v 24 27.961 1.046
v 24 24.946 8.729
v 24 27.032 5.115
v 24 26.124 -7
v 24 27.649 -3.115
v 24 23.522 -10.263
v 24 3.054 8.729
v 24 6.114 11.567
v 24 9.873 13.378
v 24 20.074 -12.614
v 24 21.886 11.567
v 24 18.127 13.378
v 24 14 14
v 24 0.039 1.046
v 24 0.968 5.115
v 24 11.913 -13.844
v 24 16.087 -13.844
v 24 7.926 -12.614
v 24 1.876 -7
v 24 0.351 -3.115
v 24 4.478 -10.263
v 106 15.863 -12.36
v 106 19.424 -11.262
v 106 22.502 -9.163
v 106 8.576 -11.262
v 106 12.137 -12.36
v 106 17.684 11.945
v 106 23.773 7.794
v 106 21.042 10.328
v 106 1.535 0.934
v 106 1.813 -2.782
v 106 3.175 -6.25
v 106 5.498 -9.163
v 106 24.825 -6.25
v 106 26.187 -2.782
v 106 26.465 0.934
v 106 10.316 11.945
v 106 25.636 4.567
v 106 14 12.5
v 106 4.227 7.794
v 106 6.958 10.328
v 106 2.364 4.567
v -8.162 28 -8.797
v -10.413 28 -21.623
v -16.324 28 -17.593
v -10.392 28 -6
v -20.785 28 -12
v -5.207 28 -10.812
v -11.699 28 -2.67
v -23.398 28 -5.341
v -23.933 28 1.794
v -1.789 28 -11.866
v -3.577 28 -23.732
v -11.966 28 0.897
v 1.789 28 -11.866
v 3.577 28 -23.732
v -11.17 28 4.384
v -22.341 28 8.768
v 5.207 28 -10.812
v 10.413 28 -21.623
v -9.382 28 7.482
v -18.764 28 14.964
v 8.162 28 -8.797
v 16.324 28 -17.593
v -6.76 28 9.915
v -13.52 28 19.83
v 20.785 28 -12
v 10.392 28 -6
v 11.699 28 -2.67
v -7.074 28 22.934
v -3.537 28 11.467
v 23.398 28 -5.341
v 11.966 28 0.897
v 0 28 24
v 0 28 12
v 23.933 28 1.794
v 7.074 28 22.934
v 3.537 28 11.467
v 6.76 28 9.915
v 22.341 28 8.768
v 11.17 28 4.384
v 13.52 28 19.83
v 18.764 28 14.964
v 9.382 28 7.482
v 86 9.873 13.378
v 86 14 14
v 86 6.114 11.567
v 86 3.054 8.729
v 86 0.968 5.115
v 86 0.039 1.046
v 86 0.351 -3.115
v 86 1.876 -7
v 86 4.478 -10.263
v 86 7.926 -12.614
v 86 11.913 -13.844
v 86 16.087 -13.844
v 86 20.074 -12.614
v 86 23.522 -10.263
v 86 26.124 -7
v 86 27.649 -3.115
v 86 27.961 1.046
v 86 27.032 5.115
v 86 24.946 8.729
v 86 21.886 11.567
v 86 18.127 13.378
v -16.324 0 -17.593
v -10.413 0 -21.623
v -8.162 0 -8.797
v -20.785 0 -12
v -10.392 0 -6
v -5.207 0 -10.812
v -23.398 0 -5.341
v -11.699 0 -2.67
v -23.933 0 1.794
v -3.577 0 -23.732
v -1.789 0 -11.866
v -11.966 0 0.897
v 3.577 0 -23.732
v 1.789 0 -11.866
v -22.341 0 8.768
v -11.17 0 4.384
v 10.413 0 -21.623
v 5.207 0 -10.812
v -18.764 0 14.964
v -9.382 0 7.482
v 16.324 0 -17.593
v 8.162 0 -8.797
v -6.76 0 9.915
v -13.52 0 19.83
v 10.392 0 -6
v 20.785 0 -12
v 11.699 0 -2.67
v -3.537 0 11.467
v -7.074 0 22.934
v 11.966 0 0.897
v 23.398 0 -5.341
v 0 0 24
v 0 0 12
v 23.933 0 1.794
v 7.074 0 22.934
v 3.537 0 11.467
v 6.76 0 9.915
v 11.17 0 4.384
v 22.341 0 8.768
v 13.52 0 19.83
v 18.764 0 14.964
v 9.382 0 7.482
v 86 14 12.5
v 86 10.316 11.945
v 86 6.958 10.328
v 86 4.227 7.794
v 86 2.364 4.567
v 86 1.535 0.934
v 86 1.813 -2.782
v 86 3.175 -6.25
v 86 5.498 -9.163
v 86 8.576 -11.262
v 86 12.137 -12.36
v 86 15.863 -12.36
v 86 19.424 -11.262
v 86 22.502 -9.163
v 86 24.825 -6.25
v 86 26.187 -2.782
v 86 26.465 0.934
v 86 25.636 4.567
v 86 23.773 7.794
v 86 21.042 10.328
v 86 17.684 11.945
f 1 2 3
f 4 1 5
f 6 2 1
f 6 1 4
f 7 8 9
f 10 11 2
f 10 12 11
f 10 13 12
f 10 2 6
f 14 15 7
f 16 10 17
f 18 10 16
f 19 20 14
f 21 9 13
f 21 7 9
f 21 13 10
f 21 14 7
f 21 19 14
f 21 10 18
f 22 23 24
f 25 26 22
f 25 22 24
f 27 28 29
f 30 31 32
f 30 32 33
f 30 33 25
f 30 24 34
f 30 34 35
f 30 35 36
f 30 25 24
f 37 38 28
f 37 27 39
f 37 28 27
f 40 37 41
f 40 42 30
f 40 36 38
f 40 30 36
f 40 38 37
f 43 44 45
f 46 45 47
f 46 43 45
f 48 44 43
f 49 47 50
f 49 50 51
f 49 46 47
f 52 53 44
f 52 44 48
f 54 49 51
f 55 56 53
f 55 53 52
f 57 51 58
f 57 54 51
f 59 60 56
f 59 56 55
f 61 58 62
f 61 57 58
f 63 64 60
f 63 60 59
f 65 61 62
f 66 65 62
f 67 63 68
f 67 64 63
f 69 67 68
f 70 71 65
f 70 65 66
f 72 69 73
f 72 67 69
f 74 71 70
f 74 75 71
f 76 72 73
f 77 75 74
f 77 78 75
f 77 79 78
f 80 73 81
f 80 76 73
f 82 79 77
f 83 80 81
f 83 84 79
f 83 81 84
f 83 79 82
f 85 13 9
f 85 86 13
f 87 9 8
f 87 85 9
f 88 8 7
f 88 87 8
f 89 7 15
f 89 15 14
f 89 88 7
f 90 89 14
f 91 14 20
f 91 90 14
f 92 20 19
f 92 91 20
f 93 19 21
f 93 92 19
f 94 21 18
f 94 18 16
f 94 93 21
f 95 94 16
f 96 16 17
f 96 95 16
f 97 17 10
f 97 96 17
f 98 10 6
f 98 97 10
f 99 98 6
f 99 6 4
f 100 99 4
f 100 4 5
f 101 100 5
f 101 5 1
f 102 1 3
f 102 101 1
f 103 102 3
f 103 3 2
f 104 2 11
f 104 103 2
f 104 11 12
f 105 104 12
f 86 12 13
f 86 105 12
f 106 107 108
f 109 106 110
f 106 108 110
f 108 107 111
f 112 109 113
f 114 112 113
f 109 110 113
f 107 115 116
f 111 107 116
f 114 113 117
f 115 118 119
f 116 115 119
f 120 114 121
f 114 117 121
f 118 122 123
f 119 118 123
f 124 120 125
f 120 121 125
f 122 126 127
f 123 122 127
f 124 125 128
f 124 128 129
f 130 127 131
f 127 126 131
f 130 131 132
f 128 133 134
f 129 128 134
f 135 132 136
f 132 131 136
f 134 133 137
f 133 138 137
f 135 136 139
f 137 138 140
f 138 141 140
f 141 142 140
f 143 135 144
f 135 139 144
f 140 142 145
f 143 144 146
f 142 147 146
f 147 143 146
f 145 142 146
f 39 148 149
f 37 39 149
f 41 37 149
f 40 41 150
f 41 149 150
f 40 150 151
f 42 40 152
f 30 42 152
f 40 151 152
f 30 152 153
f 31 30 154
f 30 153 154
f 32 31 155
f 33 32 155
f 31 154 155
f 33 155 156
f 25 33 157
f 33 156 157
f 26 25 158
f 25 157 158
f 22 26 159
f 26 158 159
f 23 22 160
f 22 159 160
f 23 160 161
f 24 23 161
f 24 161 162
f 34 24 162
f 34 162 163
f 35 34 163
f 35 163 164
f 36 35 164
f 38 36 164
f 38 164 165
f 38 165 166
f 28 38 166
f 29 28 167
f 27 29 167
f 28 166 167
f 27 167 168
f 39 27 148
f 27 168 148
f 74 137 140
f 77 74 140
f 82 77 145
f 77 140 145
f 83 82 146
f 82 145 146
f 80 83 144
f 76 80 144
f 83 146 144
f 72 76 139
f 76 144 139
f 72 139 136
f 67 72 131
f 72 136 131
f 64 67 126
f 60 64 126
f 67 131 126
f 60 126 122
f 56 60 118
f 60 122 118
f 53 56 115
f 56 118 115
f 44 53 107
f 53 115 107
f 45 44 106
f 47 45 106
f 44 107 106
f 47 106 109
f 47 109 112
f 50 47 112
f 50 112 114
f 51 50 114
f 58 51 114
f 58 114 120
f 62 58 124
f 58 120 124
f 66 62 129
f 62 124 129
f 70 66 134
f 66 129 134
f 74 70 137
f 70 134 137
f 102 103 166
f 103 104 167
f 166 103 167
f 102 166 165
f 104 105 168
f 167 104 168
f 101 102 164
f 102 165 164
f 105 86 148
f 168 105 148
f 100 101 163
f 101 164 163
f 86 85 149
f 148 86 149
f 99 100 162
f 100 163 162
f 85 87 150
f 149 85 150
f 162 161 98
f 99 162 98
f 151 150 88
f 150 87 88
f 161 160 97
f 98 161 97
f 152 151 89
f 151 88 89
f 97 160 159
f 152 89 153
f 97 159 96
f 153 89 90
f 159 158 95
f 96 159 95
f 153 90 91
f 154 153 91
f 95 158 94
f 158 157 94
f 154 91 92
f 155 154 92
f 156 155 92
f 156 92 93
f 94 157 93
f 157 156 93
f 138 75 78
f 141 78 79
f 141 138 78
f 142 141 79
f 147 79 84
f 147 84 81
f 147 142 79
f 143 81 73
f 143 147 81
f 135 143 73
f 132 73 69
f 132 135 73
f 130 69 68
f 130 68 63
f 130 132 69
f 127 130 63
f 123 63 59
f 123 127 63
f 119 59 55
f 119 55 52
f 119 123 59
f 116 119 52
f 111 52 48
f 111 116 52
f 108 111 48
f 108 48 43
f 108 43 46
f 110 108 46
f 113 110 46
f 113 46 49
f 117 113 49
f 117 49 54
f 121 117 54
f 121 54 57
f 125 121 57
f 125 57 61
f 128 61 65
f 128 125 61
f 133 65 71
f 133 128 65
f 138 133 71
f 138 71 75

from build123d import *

# Parameters (mm, degrees)
SKETCH1_R           = 24
SKETCH1_R_2         = 12
BOSS_EXTRUDE1_DEPTH = 28
SKETCH2_W           = 62
SKETCH2_H           = 14
SKETCH3_R           = 12.5
BOSS_EXTRUDE2_DEPTH = 20


with BuildPart() as part:
    # Sketch1 → Boss-Extrude1 (new body)
    with BuildSketch(Plane(origin=(0, 0, 0), x_dir=(1, 0, 0), z_dir=(0, 1, 0))):
        with Locations(Location((0, 0, 0), (0, 0, 270))):
            Circle(SKETCH1_R)
        with Locations(Location((0, 0, 0), (0, 0, 270))):
            Circle(SKETCH1_R_2, mode=Mode.SUBTRACT)
    extrude(amount=BOSS_EXTRUDE1_DEPTH)


with BuildPart() as body_2:
    # Sketch2 → Revolve1 (revolve)
    with BuildSketch(Plane.XY, mode=Mode.PRIVATE) as revolve1_sk:
        with Locations((55, 21)):
            Rectangle(SKETCH2_W, SKETCH2_H)
    revolve(revolve1_sk.sketch.rotate(Axis((-976, 14, 0), (1, 0, 0)), 90), axis=Axis((-976, 14, 0), (1, 0, 0)))

    # Sketch3 → Boss-Extrude2 (add)
    with BuildSketch(Plane(origin=(86, 0, 0), x_dir=(0, 0, -1), z_dir=(1, 0, 0))):
        with Locations(Location((0, 14, 0), (0, 0, 180))):
            Circle(SKETCH3_R)
    extrude(amount=BOSS_EXTRUDE2_DEPTH)


solid = Compound([part.part, body_2.part])
